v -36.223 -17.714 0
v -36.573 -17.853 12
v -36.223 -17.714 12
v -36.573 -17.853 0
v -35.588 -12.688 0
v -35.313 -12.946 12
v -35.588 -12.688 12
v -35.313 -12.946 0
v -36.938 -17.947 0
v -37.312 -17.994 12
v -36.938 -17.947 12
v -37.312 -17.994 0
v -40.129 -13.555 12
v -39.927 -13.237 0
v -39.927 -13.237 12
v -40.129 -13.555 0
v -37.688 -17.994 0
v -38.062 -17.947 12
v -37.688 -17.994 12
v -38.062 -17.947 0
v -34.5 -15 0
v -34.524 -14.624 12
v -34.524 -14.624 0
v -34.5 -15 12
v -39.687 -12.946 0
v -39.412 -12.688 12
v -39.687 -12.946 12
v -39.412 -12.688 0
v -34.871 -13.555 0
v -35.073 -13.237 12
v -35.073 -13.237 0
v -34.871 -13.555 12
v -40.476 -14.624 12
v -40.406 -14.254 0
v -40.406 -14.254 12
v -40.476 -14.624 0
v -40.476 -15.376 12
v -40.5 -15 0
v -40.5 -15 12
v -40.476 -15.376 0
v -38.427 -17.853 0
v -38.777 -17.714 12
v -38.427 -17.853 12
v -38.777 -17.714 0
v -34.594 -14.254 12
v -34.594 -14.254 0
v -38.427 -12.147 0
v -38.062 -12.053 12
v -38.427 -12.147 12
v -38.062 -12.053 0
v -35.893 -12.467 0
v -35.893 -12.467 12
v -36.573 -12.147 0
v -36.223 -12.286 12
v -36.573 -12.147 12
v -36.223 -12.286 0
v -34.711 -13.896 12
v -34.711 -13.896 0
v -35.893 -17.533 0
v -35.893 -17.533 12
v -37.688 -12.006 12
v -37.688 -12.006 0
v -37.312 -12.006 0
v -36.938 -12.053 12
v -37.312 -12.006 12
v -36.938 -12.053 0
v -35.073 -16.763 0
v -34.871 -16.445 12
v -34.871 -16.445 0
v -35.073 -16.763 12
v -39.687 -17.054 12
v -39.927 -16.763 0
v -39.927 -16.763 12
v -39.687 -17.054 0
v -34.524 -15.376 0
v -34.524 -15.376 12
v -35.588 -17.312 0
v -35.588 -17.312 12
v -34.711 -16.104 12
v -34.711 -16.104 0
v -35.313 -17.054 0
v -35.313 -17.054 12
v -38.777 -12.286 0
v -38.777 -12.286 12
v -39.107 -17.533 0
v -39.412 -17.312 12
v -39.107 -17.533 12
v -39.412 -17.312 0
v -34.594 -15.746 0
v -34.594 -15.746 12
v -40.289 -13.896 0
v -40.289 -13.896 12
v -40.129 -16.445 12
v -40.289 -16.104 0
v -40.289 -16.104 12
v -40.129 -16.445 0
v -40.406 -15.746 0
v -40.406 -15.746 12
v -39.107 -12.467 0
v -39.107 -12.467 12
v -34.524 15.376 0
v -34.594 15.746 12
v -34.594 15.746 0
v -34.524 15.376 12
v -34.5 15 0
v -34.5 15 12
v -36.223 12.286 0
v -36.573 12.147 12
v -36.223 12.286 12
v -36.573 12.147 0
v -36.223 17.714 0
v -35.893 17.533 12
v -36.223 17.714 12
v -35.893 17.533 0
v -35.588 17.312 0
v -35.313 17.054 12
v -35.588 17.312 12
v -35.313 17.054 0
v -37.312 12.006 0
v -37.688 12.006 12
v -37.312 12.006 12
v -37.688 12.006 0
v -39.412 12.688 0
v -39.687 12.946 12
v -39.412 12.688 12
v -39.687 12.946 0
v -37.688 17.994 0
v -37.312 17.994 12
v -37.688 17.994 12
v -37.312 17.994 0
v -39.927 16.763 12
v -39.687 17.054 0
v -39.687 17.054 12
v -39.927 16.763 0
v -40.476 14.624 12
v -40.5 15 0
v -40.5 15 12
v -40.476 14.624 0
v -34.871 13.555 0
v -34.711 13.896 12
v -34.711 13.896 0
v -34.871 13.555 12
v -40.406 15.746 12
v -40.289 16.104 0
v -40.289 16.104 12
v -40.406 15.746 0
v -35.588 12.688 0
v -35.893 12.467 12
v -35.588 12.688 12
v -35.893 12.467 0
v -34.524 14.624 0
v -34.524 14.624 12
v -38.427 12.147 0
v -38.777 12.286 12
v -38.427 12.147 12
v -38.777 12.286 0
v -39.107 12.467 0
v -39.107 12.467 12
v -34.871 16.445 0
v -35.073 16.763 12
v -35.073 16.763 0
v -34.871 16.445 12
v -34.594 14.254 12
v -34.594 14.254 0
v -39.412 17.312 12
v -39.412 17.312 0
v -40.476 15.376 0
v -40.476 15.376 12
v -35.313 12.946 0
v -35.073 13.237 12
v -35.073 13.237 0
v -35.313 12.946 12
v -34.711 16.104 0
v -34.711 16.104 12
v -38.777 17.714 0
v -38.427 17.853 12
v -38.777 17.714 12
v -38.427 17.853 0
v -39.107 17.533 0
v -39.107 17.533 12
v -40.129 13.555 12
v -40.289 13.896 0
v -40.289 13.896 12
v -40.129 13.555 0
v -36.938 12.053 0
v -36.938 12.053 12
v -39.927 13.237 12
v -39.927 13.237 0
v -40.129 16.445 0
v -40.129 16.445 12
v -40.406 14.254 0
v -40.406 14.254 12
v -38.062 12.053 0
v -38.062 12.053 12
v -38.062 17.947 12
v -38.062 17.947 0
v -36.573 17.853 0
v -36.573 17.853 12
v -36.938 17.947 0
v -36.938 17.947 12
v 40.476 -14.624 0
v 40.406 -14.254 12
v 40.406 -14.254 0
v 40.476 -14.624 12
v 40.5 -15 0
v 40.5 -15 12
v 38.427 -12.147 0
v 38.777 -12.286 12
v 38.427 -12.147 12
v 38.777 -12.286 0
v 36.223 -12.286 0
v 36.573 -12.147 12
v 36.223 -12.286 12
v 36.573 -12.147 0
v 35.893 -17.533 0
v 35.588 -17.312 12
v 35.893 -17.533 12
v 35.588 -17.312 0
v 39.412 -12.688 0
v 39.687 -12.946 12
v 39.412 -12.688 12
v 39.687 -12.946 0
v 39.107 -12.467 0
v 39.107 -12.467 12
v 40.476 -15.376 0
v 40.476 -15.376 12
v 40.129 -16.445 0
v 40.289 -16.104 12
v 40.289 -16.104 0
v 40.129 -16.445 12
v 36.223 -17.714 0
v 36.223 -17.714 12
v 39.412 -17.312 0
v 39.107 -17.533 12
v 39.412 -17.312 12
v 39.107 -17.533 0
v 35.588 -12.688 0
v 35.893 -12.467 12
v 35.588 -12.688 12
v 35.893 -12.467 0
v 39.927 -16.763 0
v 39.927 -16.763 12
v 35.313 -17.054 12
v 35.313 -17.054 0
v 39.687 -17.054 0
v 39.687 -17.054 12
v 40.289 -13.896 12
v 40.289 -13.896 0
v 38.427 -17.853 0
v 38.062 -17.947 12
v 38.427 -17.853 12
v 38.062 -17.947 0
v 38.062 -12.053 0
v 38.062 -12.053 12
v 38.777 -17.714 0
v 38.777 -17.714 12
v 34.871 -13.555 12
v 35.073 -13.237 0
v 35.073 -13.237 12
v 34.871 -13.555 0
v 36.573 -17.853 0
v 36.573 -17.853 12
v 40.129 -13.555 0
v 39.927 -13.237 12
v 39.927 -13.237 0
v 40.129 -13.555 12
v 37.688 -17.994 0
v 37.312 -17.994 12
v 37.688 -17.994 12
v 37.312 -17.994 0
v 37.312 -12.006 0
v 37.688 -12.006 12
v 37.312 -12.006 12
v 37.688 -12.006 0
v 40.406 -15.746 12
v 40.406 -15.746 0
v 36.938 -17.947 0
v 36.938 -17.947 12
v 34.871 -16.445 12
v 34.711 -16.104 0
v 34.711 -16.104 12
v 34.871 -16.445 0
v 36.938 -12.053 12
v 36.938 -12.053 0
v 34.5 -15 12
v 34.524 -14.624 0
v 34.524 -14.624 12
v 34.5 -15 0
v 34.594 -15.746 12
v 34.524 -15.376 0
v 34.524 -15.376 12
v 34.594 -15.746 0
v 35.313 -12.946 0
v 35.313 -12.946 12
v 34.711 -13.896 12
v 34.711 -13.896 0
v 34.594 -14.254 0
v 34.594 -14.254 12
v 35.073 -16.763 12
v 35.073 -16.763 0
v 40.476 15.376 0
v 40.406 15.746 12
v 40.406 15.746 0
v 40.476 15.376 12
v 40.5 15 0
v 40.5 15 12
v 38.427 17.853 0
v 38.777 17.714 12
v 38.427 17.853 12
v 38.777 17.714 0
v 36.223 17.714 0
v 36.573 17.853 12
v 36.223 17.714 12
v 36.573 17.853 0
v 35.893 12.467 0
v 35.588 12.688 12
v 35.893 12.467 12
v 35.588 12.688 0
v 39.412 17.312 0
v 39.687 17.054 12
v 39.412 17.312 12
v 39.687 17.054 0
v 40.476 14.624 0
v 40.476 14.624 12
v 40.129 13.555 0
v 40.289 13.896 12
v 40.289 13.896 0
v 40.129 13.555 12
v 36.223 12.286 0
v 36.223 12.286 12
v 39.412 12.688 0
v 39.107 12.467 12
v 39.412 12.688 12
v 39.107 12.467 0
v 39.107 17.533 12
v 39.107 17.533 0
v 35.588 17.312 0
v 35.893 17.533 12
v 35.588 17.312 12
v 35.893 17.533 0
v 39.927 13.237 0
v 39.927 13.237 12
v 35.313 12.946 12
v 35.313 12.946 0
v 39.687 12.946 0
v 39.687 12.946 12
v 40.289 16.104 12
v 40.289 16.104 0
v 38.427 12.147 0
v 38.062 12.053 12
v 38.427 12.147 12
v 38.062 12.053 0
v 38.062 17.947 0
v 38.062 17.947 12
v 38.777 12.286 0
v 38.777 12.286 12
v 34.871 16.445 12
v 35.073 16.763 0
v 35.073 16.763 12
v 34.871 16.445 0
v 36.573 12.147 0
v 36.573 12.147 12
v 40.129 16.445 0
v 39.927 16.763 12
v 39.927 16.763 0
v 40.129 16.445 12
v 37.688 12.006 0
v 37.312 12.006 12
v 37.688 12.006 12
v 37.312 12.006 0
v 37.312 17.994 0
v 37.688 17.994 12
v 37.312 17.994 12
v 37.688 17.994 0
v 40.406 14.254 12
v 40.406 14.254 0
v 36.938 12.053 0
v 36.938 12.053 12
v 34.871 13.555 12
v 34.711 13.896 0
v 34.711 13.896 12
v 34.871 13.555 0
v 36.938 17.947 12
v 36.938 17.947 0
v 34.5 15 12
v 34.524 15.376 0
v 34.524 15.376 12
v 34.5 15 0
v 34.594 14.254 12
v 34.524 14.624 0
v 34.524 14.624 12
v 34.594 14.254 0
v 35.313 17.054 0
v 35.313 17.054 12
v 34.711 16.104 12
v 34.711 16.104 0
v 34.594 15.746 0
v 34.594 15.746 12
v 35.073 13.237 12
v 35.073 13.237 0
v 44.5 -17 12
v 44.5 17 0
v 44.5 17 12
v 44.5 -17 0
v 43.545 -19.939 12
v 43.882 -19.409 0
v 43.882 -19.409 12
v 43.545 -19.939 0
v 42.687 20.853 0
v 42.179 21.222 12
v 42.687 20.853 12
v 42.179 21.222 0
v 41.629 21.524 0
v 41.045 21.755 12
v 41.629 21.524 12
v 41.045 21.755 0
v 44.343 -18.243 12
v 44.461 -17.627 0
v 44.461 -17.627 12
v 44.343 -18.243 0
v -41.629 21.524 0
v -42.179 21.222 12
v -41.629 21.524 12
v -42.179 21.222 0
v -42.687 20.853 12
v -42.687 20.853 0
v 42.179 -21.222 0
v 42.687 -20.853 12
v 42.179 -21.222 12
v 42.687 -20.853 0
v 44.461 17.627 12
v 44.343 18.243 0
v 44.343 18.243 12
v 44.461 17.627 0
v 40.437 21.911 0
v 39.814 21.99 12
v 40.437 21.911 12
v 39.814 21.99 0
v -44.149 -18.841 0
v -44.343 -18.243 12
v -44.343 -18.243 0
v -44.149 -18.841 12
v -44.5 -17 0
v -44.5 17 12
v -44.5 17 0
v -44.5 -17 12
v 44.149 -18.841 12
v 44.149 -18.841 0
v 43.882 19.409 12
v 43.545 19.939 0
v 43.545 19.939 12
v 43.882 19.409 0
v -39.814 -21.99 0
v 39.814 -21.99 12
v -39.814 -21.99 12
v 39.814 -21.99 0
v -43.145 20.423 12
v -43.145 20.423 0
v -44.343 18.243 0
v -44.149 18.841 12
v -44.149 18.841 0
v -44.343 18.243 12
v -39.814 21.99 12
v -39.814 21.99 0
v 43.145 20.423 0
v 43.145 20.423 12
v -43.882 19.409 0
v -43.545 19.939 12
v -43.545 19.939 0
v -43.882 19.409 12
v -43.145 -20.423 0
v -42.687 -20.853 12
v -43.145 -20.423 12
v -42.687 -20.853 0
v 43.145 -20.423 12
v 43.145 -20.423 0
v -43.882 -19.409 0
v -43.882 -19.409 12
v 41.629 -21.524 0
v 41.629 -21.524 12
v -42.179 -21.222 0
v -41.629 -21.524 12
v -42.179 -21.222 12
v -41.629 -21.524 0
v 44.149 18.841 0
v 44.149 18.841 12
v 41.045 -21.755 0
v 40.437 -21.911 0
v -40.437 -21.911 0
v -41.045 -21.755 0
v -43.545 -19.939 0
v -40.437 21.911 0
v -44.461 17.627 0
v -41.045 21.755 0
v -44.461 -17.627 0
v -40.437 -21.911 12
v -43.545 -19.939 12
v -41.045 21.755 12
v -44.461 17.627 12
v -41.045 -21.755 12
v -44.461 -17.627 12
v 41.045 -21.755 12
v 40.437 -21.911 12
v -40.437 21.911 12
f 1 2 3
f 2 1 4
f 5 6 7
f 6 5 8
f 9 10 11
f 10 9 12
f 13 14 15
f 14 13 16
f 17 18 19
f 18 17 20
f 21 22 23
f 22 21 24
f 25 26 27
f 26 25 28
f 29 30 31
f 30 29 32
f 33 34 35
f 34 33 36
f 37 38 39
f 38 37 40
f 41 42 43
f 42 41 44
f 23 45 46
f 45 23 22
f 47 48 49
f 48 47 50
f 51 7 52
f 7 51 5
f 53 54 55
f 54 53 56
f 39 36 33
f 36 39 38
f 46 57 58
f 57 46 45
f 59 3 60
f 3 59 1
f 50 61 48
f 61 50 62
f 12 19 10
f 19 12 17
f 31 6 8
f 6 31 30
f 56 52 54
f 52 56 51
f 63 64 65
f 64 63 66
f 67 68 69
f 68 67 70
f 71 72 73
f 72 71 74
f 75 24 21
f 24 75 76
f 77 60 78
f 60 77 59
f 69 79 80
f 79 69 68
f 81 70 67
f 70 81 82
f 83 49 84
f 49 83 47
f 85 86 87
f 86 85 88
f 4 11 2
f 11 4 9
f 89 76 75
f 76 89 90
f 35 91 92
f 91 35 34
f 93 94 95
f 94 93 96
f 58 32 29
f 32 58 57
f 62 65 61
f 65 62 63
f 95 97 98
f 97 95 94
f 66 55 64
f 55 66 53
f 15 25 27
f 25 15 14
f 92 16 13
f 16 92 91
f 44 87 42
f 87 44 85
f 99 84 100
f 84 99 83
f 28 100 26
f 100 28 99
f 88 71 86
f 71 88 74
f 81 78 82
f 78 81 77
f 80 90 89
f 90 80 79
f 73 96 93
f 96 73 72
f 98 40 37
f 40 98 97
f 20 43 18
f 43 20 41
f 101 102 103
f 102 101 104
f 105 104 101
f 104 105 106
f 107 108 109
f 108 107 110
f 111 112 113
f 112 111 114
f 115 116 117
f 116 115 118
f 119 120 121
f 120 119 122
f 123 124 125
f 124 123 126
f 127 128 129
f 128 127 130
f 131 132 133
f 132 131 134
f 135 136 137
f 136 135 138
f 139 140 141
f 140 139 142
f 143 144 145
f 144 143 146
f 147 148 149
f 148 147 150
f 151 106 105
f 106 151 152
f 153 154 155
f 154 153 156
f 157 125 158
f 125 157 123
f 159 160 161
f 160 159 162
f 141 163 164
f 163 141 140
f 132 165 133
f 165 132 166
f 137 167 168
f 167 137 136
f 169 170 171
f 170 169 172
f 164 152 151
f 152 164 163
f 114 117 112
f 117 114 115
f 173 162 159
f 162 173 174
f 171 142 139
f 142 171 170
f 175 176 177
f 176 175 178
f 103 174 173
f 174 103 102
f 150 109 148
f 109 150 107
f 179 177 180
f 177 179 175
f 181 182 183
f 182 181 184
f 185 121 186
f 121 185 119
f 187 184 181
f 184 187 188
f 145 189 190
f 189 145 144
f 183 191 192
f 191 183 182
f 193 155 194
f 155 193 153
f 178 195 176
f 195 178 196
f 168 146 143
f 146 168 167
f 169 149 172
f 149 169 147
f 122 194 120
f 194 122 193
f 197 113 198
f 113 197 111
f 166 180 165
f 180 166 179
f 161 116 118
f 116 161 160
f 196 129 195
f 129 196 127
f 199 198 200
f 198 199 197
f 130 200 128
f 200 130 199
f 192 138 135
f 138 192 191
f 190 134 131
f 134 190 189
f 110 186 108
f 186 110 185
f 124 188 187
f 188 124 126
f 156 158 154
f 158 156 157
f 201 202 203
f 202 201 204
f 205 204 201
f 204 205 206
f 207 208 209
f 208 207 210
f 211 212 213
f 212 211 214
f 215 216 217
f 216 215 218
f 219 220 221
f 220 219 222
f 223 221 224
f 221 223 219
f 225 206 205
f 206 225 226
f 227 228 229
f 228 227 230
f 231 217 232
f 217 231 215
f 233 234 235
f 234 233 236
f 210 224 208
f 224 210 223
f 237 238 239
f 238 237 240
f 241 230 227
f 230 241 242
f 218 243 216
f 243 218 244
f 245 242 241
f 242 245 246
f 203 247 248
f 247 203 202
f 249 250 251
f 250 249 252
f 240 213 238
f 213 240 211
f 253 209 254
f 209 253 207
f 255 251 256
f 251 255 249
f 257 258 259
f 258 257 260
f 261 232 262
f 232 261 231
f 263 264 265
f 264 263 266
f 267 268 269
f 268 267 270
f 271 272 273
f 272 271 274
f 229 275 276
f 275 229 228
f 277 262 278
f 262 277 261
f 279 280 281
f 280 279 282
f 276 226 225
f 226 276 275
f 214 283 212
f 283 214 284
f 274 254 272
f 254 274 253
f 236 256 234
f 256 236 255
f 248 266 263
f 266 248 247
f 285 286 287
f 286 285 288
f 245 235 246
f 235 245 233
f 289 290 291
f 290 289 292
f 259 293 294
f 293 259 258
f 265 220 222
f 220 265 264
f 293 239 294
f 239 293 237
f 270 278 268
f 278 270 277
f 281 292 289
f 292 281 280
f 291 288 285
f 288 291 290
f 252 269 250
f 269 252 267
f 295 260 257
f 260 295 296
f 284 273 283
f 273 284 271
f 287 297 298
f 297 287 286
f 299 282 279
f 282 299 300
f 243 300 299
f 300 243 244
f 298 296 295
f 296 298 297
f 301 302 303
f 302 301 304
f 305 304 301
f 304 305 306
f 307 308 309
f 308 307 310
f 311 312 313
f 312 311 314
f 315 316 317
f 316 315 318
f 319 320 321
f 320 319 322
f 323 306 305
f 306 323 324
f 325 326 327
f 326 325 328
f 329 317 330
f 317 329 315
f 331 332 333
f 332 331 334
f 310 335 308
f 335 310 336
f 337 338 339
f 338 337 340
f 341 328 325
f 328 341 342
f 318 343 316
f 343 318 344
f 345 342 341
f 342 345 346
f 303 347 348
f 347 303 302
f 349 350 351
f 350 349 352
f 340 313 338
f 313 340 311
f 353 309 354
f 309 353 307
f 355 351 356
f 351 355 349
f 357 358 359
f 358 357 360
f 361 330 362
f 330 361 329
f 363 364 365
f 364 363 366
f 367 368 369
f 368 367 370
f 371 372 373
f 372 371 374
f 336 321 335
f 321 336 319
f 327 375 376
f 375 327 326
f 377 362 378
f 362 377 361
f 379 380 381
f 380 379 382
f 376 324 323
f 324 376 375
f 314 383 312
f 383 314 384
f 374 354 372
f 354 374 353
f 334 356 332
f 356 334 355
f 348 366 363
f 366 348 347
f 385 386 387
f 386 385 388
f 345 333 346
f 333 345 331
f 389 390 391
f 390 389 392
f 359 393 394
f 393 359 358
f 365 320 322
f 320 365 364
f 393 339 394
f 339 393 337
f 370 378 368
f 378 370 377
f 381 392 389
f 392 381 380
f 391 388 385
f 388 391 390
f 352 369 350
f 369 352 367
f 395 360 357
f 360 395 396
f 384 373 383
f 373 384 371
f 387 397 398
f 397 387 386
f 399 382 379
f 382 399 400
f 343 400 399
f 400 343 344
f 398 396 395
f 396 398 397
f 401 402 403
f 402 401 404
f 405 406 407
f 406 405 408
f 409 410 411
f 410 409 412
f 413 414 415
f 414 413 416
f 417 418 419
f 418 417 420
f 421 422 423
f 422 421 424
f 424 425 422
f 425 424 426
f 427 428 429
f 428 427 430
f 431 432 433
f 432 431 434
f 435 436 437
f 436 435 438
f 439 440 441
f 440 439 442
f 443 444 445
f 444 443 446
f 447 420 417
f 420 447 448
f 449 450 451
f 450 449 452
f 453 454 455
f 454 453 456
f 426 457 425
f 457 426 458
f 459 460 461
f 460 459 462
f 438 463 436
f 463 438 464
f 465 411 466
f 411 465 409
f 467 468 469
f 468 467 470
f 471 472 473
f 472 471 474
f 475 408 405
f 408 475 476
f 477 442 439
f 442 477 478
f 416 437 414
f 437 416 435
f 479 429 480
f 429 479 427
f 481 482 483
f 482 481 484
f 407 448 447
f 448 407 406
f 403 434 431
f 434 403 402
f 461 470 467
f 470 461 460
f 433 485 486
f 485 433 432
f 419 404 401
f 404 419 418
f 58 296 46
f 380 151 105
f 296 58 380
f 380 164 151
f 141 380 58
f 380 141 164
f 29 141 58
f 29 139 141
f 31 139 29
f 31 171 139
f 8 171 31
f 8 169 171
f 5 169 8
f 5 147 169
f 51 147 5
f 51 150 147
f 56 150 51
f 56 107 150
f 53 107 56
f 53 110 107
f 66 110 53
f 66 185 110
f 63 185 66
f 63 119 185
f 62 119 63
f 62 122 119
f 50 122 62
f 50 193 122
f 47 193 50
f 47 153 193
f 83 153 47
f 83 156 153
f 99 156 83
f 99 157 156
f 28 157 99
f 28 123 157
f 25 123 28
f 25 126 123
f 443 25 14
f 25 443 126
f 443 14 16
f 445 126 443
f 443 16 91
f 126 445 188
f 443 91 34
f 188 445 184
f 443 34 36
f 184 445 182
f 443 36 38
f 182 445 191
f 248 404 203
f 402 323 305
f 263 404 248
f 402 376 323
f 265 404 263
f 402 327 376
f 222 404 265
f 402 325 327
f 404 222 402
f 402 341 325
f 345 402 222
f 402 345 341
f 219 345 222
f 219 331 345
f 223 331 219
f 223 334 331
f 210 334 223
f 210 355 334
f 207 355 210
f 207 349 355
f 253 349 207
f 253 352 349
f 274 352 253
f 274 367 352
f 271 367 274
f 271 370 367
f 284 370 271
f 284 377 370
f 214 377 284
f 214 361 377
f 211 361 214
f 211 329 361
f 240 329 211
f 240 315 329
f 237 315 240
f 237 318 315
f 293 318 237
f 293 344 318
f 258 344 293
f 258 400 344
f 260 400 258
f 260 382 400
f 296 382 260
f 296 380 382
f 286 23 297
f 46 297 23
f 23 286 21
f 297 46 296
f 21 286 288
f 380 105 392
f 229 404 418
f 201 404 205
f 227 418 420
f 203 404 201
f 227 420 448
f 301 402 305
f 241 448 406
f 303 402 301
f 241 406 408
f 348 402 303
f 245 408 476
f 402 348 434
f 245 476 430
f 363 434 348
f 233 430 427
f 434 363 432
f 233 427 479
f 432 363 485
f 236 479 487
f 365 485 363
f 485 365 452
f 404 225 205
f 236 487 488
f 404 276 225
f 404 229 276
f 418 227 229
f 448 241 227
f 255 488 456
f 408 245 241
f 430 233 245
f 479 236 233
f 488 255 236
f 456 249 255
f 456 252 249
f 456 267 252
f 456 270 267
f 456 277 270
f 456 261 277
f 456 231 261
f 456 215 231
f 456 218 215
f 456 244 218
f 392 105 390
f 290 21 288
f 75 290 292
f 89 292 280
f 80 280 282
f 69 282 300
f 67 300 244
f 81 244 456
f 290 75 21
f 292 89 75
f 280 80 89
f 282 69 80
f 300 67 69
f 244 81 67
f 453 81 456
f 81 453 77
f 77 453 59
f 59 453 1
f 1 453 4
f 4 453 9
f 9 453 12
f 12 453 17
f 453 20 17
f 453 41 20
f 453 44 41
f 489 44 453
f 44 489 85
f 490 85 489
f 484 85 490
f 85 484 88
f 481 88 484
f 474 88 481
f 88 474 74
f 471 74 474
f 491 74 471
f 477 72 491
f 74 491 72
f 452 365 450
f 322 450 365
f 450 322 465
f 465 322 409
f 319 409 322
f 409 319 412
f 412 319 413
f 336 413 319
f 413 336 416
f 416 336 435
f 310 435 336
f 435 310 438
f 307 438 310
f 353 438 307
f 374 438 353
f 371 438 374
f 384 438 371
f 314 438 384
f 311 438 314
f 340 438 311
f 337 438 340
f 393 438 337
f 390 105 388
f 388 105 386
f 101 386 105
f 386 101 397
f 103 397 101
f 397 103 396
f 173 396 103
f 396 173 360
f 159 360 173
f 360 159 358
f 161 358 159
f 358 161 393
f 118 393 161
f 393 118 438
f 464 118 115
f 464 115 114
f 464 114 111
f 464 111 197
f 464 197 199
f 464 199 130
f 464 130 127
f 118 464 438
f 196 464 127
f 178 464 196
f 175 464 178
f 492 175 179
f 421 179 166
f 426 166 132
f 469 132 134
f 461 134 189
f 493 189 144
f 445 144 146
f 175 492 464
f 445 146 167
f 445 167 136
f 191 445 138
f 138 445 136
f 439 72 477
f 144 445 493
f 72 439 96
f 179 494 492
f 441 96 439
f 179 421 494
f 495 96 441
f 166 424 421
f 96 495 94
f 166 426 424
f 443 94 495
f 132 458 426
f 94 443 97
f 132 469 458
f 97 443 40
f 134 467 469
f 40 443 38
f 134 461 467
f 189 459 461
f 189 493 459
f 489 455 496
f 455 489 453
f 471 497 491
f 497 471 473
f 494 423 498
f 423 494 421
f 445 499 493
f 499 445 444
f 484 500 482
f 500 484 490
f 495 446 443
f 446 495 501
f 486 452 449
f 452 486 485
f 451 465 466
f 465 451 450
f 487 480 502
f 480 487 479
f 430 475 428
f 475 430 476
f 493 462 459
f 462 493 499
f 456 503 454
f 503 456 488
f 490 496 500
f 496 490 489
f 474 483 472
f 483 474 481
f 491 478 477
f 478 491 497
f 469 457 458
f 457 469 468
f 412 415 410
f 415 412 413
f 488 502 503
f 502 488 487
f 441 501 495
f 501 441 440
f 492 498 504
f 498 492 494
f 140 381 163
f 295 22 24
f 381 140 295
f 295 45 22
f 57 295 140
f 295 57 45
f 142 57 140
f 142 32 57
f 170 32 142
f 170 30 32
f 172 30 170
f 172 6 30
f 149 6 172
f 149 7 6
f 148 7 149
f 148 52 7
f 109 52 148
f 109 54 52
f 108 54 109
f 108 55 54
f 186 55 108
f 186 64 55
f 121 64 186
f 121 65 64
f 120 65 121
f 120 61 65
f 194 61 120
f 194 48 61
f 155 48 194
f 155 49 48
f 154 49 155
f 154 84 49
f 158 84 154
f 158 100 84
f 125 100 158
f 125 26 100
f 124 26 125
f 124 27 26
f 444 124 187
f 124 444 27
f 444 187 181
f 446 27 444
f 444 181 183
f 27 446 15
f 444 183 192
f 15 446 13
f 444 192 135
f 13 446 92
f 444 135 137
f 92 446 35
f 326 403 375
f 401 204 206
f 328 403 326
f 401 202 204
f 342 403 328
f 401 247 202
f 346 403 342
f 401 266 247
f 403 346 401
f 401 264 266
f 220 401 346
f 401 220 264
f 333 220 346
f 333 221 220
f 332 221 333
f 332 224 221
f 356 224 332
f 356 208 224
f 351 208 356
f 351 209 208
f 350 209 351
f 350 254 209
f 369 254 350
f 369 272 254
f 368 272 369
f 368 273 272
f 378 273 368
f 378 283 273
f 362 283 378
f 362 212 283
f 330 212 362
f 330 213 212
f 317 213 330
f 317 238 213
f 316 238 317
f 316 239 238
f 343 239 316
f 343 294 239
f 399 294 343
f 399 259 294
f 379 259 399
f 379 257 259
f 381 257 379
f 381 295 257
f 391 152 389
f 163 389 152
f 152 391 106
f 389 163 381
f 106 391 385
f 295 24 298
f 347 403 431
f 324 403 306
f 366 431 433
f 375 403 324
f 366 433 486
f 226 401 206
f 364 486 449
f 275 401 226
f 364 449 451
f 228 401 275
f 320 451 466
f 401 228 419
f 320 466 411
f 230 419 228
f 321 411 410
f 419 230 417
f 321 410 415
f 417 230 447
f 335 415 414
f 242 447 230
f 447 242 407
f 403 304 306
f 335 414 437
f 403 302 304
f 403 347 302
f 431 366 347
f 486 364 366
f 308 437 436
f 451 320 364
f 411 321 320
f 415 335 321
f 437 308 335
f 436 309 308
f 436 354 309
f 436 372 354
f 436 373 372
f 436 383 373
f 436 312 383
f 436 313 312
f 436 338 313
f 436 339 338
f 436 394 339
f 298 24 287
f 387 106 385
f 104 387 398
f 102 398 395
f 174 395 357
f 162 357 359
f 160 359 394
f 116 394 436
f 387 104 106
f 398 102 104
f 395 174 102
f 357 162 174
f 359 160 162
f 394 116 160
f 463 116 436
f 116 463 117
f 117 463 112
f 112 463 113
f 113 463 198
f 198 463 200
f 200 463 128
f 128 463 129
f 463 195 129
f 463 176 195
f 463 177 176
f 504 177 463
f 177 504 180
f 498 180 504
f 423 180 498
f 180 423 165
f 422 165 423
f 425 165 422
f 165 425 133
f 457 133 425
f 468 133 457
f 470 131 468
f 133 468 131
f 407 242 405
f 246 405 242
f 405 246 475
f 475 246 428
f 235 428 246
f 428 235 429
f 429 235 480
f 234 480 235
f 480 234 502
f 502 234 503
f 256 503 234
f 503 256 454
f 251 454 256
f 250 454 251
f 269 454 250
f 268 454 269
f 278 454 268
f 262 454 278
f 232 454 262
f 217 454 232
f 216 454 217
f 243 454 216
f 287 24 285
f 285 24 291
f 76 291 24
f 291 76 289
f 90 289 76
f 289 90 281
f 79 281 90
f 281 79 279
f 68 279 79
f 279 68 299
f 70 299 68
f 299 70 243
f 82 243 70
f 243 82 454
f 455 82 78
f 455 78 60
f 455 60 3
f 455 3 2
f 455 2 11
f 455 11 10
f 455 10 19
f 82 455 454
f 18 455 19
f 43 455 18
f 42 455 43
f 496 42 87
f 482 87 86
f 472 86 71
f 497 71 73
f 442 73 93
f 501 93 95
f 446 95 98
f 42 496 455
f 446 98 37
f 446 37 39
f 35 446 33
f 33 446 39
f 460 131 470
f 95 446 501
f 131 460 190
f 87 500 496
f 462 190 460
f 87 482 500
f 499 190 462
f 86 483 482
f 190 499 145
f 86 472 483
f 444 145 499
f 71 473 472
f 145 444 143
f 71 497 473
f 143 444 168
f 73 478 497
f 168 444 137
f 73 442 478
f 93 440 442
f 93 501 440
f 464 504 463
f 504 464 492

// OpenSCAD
$fn = 50;


difference() {
	union() {
		hull() {
			translate(v = [-39.5000000000, 17.0000000000, 0]) {
				cylinder(h = 12, r = 5);
			}
			translate(v = [39.5000000000, 17.0000000000, 0]) {
				cylinder(h = 12, r = 5);
			}
			translate(v = [-39.5000000000, -17.0000000000, 0]) {
				cylinder(h = 12, r = 5);
			}
			translate(v = [39.5000000000, -17.0000000000, 0]) {
				cylinder(h = 12, r = 5);
			}
		}
	}
	union() {
		translate(v = [-37.5000000000, -15.0000000000, -100.0000000000]) {
			cylinder(h = 200, r = 3.0000000000);
		}
		translate(v = [-37.5000000000, 15.0000000000, -100.0000000000]) {
			cylinder(h = 200, r = 3.0000000000);
		}
		translate(v = [37.5000000000, -15.0000000000, -100.0000000000]) {
			cylinder(h = 200, r = 3.0000000000);
		}
		translate(v = [37.5000000000, 15.0000000000, -100.0000000000]) {
			cylinder(h = 200, r = 3.0000000000);
		}
	}
}
